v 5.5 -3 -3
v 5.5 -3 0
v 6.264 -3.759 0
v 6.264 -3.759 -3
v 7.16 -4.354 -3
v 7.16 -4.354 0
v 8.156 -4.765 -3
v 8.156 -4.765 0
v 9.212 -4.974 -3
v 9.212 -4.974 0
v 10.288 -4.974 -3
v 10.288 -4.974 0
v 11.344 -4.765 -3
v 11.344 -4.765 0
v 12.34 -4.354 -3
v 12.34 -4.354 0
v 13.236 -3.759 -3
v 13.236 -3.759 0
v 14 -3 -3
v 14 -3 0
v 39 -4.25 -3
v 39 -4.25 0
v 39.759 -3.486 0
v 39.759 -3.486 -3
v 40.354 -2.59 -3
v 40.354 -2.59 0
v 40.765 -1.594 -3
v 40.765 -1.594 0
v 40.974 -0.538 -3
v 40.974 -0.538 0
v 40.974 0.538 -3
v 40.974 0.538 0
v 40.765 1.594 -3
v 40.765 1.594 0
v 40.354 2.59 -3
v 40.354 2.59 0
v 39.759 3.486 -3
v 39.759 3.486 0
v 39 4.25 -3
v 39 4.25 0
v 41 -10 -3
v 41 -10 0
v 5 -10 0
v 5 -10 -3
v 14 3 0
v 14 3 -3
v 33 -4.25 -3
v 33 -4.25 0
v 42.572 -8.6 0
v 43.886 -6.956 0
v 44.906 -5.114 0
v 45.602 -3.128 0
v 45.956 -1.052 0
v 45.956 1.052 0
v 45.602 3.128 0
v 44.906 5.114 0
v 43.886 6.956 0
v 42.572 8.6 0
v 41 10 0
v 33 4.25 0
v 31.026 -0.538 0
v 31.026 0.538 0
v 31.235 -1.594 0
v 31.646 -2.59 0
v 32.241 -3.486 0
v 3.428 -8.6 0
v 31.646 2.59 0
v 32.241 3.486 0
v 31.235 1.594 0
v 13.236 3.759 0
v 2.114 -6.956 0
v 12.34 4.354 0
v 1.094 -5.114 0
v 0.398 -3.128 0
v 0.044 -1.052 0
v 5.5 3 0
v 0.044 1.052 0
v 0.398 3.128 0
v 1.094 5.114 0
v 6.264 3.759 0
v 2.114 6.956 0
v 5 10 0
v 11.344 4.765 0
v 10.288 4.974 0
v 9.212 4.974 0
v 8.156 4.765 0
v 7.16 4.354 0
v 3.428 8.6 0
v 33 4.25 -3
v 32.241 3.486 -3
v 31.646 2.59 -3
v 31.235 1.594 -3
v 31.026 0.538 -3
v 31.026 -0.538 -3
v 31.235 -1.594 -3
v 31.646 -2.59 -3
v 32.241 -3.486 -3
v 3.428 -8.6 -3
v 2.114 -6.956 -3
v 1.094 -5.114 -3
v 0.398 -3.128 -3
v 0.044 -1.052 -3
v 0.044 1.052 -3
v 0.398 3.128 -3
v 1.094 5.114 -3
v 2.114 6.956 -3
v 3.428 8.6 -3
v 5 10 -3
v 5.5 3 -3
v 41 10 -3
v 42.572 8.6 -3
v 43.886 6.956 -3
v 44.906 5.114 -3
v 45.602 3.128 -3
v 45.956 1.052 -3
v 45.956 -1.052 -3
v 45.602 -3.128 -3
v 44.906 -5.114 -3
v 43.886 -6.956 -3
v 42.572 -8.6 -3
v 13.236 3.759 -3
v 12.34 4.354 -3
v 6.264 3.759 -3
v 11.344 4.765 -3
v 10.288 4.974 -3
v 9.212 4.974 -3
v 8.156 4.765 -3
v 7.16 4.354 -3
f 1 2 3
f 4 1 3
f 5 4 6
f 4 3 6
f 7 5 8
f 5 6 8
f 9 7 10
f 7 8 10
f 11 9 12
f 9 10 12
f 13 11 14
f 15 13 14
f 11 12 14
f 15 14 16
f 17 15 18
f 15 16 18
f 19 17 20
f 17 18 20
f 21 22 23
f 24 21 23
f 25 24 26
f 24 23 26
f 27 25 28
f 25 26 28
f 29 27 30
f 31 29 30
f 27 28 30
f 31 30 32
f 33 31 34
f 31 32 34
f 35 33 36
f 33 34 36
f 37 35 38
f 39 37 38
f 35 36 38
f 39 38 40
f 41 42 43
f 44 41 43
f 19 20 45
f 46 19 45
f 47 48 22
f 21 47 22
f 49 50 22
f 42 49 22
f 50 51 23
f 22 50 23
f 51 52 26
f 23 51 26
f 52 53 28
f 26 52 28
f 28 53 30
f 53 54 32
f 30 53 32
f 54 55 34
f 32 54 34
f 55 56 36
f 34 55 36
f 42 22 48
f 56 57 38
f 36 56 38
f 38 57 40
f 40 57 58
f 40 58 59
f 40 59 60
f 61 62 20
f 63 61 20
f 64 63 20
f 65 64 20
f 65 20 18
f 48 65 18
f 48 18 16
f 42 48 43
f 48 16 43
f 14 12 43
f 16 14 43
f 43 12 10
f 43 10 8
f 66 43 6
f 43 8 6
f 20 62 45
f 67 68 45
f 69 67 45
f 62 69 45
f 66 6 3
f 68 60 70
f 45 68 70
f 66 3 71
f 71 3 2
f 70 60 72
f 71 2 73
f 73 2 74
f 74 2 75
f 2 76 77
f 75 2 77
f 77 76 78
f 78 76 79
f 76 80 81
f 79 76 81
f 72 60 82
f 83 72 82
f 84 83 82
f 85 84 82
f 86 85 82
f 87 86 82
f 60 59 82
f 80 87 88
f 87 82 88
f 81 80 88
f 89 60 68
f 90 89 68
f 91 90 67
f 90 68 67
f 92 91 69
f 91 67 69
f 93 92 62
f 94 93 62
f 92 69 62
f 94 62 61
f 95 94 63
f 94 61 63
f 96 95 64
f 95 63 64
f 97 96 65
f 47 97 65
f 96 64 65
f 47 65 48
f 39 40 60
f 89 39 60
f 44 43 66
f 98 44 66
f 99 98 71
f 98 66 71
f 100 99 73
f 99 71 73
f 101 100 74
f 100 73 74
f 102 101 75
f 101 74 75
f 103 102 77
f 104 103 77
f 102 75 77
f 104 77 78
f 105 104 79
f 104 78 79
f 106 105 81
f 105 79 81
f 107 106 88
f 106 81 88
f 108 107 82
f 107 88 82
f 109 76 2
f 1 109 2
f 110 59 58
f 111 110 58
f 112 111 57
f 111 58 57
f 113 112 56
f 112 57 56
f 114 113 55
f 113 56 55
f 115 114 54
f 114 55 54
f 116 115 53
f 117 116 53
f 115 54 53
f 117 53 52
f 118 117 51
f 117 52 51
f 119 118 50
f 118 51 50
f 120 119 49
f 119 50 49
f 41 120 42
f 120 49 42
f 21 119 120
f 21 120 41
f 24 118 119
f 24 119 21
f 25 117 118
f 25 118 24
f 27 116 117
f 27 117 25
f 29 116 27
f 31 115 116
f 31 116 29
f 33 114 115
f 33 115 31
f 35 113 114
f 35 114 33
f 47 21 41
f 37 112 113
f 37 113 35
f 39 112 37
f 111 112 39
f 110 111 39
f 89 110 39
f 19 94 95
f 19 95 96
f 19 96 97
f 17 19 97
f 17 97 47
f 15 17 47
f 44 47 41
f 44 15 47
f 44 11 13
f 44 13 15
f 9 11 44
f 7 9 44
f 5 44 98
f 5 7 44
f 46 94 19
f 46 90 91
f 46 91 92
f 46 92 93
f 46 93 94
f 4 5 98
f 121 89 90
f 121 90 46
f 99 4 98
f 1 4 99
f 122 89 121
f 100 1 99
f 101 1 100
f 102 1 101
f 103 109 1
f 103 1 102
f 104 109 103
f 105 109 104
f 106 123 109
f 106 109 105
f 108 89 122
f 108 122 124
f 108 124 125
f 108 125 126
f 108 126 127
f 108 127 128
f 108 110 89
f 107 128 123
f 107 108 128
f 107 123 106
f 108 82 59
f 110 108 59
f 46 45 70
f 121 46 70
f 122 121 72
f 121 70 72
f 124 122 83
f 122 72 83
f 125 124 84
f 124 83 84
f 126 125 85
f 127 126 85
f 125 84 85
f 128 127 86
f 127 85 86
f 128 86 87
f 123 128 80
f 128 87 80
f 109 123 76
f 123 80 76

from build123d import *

# Parameters (mm, degrees)
BASE_FLANGE1_DEPTH = 3
CUT_EXTRUDE1_DEPTH = 10


# Sheet-metal steps are written as plain solids
with BuildPart() as part:
    # Sketch1 → Base-Flange1 (new body)
    with BuildSketch(Plane.XY):
        with BuildLine():
            Line((5, 10), (41, 10))
            ThreePointArc((41, 10), (46, 0), (41, -10))
            Line((41, -10), (5, -10))
            ThreePointArc((5, -10), (0, 0), (5, 10))
        make_face()
    extrude(amount=-BASE_FLANGE1_DEPTH)

    # Sketch4 → Cut-Extrude1 (cut)
    with BuildSketch(Plane.XY):
        with BuildLine():
            Line((5.5, 3), (5.5, -3))
            ThreePointArc((5.5, -3), (9.75, -5), (14, -3))
            Line((14, -3), (14, 3))
            ThreePointArc((14, 3), (9.75, 5), (5.5, 3))
        make_face()
        with BuildLine():
            Line((39, 4.25), (33, 4.25))
            ThreePointArc((33, 4.25), (31, 0), (33, -4.25))
            Line((33, -4.25), (39, -4.25))
            ThreePointArc((39, -4.25), (41, 0), (39, 4.25))
        make_face()
    extrude(amount=-CUT_EXTRUDE1_DEPTH, mode=Mode.SUBTRACT)


solid = part.part
